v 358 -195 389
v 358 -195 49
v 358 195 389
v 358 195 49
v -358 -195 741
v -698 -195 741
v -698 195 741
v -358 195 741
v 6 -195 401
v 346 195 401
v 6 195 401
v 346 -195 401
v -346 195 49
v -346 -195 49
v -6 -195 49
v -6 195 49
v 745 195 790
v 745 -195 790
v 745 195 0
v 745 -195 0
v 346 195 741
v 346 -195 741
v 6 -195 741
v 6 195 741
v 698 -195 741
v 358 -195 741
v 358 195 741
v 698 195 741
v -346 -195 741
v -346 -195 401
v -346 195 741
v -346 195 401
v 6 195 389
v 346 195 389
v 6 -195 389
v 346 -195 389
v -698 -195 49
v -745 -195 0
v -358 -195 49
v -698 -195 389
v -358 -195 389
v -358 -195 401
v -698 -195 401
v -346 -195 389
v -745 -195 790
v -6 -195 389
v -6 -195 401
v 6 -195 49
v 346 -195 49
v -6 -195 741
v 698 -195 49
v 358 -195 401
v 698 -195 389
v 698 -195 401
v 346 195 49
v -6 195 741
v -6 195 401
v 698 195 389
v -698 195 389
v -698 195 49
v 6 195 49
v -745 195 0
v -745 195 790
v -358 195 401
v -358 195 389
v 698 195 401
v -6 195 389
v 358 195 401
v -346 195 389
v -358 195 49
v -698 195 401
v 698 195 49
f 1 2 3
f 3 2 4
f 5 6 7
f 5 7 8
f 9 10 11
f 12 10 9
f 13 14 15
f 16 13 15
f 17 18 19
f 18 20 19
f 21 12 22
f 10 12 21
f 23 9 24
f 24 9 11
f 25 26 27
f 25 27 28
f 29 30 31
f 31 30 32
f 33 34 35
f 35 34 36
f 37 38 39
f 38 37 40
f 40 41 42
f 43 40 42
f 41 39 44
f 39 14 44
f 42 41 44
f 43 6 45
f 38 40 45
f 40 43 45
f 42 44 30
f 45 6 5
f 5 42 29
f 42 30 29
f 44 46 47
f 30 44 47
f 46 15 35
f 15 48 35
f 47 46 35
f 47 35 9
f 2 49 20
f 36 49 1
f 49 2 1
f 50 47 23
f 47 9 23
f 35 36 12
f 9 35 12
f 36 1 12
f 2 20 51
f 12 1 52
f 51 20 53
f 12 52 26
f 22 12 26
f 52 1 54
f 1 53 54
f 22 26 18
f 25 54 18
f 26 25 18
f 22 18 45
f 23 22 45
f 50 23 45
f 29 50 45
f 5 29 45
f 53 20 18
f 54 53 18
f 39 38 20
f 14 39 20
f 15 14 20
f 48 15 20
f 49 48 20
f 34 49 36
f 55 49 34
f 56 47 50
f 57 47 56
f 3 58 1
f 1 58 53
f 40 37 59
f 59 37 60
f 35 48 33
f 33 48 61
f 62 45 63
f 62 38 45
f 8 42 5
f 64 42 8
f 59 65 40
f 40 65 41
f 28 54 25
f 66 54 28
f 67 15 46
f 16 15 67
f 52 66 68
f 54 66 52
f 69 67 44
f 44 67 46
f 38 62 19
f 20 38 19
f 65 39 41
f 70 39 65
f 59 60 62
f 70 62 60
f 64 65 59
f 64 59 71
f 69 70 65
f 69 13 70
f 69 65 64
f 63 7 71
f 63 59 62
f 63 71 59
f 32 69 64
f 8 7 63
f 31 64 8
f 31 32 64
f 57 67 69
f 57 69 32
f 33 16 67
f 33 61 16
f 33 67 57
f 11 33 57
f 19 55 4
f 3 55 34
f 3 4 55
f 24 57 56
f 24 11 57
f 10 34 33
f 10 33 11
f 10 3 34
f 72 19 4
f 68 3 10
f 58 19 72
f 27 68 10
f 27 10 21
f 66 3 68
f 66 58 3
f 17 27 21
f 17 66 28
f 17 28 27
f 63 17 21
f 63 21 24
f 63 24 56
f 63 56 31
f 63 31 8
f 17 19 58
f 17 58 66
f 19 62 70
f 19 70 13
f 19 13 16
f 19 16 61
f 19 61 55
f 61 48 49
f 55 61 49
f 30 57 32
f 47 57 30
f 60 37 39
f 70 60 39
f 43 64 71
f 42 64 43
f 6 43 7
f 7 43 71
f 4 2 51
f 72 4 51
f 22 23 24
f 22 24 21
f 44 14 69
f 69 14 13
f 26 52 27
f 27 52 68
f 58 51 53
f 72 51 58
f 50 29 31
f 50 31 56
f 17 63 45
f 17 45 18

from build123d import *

# Parameters (mm, degrees)
F0_W     = 1490
F0_H     = 390
F1_DEPTH = 49
F2_W     = 47
F2_H     = 390
F2_W_2   = 12
F3_DEPTH = 692
F4_W     = 1490
F4_H     = 390
F5_DEPTH = 49
F6_W     = 390
F6_H     = 12
F7_DEPTH = 1410


with BuildPart() as f1:
    # F0 (on Top) → F1 (new body)
    with BuildSketch(Plane.XY):
        Rectangle(F0_W, F0_H)
    extrude(amount=F1_DEPTH)

    # F2 (on face) → F3 (join)
    with BuildSketch(Plane.XY.offset(49)):
        with Locations((-721.5, 0)):
            Rectangle(F2_W, F2_H)
        with Locations((721.5, 0)):
            Rectangle(F2_W, F2_H)
        with Locations((352, 0)):
            Rectangle(F2_W_2, F2_H)
        Rectangle(F2_W_2, F2_H)
        with Locations((-352, 0)):
            Rectangle(F2_W_2, F2_H)
    extrude(amount=F3_DEPTH)

    # F4 (on face) → F5 (join)
    with BuildSketch(Plane.XY.offset(741)):
        Rectangle(F4_W, F4_H)
    extrude(amount=F5_DEPTH)

    # F6 (on face) → F7 (join)
    with BuildSketch(Plane(origin=(698, 0, 0), x_dir=(0, -1, 0), z_dir=(-1, 0, 0))):
        with Locations((0, 395)):
            Rectangle(F6_W, F6_H)
    extrude(amount=F7_DEPTH)


solid = f1.part
